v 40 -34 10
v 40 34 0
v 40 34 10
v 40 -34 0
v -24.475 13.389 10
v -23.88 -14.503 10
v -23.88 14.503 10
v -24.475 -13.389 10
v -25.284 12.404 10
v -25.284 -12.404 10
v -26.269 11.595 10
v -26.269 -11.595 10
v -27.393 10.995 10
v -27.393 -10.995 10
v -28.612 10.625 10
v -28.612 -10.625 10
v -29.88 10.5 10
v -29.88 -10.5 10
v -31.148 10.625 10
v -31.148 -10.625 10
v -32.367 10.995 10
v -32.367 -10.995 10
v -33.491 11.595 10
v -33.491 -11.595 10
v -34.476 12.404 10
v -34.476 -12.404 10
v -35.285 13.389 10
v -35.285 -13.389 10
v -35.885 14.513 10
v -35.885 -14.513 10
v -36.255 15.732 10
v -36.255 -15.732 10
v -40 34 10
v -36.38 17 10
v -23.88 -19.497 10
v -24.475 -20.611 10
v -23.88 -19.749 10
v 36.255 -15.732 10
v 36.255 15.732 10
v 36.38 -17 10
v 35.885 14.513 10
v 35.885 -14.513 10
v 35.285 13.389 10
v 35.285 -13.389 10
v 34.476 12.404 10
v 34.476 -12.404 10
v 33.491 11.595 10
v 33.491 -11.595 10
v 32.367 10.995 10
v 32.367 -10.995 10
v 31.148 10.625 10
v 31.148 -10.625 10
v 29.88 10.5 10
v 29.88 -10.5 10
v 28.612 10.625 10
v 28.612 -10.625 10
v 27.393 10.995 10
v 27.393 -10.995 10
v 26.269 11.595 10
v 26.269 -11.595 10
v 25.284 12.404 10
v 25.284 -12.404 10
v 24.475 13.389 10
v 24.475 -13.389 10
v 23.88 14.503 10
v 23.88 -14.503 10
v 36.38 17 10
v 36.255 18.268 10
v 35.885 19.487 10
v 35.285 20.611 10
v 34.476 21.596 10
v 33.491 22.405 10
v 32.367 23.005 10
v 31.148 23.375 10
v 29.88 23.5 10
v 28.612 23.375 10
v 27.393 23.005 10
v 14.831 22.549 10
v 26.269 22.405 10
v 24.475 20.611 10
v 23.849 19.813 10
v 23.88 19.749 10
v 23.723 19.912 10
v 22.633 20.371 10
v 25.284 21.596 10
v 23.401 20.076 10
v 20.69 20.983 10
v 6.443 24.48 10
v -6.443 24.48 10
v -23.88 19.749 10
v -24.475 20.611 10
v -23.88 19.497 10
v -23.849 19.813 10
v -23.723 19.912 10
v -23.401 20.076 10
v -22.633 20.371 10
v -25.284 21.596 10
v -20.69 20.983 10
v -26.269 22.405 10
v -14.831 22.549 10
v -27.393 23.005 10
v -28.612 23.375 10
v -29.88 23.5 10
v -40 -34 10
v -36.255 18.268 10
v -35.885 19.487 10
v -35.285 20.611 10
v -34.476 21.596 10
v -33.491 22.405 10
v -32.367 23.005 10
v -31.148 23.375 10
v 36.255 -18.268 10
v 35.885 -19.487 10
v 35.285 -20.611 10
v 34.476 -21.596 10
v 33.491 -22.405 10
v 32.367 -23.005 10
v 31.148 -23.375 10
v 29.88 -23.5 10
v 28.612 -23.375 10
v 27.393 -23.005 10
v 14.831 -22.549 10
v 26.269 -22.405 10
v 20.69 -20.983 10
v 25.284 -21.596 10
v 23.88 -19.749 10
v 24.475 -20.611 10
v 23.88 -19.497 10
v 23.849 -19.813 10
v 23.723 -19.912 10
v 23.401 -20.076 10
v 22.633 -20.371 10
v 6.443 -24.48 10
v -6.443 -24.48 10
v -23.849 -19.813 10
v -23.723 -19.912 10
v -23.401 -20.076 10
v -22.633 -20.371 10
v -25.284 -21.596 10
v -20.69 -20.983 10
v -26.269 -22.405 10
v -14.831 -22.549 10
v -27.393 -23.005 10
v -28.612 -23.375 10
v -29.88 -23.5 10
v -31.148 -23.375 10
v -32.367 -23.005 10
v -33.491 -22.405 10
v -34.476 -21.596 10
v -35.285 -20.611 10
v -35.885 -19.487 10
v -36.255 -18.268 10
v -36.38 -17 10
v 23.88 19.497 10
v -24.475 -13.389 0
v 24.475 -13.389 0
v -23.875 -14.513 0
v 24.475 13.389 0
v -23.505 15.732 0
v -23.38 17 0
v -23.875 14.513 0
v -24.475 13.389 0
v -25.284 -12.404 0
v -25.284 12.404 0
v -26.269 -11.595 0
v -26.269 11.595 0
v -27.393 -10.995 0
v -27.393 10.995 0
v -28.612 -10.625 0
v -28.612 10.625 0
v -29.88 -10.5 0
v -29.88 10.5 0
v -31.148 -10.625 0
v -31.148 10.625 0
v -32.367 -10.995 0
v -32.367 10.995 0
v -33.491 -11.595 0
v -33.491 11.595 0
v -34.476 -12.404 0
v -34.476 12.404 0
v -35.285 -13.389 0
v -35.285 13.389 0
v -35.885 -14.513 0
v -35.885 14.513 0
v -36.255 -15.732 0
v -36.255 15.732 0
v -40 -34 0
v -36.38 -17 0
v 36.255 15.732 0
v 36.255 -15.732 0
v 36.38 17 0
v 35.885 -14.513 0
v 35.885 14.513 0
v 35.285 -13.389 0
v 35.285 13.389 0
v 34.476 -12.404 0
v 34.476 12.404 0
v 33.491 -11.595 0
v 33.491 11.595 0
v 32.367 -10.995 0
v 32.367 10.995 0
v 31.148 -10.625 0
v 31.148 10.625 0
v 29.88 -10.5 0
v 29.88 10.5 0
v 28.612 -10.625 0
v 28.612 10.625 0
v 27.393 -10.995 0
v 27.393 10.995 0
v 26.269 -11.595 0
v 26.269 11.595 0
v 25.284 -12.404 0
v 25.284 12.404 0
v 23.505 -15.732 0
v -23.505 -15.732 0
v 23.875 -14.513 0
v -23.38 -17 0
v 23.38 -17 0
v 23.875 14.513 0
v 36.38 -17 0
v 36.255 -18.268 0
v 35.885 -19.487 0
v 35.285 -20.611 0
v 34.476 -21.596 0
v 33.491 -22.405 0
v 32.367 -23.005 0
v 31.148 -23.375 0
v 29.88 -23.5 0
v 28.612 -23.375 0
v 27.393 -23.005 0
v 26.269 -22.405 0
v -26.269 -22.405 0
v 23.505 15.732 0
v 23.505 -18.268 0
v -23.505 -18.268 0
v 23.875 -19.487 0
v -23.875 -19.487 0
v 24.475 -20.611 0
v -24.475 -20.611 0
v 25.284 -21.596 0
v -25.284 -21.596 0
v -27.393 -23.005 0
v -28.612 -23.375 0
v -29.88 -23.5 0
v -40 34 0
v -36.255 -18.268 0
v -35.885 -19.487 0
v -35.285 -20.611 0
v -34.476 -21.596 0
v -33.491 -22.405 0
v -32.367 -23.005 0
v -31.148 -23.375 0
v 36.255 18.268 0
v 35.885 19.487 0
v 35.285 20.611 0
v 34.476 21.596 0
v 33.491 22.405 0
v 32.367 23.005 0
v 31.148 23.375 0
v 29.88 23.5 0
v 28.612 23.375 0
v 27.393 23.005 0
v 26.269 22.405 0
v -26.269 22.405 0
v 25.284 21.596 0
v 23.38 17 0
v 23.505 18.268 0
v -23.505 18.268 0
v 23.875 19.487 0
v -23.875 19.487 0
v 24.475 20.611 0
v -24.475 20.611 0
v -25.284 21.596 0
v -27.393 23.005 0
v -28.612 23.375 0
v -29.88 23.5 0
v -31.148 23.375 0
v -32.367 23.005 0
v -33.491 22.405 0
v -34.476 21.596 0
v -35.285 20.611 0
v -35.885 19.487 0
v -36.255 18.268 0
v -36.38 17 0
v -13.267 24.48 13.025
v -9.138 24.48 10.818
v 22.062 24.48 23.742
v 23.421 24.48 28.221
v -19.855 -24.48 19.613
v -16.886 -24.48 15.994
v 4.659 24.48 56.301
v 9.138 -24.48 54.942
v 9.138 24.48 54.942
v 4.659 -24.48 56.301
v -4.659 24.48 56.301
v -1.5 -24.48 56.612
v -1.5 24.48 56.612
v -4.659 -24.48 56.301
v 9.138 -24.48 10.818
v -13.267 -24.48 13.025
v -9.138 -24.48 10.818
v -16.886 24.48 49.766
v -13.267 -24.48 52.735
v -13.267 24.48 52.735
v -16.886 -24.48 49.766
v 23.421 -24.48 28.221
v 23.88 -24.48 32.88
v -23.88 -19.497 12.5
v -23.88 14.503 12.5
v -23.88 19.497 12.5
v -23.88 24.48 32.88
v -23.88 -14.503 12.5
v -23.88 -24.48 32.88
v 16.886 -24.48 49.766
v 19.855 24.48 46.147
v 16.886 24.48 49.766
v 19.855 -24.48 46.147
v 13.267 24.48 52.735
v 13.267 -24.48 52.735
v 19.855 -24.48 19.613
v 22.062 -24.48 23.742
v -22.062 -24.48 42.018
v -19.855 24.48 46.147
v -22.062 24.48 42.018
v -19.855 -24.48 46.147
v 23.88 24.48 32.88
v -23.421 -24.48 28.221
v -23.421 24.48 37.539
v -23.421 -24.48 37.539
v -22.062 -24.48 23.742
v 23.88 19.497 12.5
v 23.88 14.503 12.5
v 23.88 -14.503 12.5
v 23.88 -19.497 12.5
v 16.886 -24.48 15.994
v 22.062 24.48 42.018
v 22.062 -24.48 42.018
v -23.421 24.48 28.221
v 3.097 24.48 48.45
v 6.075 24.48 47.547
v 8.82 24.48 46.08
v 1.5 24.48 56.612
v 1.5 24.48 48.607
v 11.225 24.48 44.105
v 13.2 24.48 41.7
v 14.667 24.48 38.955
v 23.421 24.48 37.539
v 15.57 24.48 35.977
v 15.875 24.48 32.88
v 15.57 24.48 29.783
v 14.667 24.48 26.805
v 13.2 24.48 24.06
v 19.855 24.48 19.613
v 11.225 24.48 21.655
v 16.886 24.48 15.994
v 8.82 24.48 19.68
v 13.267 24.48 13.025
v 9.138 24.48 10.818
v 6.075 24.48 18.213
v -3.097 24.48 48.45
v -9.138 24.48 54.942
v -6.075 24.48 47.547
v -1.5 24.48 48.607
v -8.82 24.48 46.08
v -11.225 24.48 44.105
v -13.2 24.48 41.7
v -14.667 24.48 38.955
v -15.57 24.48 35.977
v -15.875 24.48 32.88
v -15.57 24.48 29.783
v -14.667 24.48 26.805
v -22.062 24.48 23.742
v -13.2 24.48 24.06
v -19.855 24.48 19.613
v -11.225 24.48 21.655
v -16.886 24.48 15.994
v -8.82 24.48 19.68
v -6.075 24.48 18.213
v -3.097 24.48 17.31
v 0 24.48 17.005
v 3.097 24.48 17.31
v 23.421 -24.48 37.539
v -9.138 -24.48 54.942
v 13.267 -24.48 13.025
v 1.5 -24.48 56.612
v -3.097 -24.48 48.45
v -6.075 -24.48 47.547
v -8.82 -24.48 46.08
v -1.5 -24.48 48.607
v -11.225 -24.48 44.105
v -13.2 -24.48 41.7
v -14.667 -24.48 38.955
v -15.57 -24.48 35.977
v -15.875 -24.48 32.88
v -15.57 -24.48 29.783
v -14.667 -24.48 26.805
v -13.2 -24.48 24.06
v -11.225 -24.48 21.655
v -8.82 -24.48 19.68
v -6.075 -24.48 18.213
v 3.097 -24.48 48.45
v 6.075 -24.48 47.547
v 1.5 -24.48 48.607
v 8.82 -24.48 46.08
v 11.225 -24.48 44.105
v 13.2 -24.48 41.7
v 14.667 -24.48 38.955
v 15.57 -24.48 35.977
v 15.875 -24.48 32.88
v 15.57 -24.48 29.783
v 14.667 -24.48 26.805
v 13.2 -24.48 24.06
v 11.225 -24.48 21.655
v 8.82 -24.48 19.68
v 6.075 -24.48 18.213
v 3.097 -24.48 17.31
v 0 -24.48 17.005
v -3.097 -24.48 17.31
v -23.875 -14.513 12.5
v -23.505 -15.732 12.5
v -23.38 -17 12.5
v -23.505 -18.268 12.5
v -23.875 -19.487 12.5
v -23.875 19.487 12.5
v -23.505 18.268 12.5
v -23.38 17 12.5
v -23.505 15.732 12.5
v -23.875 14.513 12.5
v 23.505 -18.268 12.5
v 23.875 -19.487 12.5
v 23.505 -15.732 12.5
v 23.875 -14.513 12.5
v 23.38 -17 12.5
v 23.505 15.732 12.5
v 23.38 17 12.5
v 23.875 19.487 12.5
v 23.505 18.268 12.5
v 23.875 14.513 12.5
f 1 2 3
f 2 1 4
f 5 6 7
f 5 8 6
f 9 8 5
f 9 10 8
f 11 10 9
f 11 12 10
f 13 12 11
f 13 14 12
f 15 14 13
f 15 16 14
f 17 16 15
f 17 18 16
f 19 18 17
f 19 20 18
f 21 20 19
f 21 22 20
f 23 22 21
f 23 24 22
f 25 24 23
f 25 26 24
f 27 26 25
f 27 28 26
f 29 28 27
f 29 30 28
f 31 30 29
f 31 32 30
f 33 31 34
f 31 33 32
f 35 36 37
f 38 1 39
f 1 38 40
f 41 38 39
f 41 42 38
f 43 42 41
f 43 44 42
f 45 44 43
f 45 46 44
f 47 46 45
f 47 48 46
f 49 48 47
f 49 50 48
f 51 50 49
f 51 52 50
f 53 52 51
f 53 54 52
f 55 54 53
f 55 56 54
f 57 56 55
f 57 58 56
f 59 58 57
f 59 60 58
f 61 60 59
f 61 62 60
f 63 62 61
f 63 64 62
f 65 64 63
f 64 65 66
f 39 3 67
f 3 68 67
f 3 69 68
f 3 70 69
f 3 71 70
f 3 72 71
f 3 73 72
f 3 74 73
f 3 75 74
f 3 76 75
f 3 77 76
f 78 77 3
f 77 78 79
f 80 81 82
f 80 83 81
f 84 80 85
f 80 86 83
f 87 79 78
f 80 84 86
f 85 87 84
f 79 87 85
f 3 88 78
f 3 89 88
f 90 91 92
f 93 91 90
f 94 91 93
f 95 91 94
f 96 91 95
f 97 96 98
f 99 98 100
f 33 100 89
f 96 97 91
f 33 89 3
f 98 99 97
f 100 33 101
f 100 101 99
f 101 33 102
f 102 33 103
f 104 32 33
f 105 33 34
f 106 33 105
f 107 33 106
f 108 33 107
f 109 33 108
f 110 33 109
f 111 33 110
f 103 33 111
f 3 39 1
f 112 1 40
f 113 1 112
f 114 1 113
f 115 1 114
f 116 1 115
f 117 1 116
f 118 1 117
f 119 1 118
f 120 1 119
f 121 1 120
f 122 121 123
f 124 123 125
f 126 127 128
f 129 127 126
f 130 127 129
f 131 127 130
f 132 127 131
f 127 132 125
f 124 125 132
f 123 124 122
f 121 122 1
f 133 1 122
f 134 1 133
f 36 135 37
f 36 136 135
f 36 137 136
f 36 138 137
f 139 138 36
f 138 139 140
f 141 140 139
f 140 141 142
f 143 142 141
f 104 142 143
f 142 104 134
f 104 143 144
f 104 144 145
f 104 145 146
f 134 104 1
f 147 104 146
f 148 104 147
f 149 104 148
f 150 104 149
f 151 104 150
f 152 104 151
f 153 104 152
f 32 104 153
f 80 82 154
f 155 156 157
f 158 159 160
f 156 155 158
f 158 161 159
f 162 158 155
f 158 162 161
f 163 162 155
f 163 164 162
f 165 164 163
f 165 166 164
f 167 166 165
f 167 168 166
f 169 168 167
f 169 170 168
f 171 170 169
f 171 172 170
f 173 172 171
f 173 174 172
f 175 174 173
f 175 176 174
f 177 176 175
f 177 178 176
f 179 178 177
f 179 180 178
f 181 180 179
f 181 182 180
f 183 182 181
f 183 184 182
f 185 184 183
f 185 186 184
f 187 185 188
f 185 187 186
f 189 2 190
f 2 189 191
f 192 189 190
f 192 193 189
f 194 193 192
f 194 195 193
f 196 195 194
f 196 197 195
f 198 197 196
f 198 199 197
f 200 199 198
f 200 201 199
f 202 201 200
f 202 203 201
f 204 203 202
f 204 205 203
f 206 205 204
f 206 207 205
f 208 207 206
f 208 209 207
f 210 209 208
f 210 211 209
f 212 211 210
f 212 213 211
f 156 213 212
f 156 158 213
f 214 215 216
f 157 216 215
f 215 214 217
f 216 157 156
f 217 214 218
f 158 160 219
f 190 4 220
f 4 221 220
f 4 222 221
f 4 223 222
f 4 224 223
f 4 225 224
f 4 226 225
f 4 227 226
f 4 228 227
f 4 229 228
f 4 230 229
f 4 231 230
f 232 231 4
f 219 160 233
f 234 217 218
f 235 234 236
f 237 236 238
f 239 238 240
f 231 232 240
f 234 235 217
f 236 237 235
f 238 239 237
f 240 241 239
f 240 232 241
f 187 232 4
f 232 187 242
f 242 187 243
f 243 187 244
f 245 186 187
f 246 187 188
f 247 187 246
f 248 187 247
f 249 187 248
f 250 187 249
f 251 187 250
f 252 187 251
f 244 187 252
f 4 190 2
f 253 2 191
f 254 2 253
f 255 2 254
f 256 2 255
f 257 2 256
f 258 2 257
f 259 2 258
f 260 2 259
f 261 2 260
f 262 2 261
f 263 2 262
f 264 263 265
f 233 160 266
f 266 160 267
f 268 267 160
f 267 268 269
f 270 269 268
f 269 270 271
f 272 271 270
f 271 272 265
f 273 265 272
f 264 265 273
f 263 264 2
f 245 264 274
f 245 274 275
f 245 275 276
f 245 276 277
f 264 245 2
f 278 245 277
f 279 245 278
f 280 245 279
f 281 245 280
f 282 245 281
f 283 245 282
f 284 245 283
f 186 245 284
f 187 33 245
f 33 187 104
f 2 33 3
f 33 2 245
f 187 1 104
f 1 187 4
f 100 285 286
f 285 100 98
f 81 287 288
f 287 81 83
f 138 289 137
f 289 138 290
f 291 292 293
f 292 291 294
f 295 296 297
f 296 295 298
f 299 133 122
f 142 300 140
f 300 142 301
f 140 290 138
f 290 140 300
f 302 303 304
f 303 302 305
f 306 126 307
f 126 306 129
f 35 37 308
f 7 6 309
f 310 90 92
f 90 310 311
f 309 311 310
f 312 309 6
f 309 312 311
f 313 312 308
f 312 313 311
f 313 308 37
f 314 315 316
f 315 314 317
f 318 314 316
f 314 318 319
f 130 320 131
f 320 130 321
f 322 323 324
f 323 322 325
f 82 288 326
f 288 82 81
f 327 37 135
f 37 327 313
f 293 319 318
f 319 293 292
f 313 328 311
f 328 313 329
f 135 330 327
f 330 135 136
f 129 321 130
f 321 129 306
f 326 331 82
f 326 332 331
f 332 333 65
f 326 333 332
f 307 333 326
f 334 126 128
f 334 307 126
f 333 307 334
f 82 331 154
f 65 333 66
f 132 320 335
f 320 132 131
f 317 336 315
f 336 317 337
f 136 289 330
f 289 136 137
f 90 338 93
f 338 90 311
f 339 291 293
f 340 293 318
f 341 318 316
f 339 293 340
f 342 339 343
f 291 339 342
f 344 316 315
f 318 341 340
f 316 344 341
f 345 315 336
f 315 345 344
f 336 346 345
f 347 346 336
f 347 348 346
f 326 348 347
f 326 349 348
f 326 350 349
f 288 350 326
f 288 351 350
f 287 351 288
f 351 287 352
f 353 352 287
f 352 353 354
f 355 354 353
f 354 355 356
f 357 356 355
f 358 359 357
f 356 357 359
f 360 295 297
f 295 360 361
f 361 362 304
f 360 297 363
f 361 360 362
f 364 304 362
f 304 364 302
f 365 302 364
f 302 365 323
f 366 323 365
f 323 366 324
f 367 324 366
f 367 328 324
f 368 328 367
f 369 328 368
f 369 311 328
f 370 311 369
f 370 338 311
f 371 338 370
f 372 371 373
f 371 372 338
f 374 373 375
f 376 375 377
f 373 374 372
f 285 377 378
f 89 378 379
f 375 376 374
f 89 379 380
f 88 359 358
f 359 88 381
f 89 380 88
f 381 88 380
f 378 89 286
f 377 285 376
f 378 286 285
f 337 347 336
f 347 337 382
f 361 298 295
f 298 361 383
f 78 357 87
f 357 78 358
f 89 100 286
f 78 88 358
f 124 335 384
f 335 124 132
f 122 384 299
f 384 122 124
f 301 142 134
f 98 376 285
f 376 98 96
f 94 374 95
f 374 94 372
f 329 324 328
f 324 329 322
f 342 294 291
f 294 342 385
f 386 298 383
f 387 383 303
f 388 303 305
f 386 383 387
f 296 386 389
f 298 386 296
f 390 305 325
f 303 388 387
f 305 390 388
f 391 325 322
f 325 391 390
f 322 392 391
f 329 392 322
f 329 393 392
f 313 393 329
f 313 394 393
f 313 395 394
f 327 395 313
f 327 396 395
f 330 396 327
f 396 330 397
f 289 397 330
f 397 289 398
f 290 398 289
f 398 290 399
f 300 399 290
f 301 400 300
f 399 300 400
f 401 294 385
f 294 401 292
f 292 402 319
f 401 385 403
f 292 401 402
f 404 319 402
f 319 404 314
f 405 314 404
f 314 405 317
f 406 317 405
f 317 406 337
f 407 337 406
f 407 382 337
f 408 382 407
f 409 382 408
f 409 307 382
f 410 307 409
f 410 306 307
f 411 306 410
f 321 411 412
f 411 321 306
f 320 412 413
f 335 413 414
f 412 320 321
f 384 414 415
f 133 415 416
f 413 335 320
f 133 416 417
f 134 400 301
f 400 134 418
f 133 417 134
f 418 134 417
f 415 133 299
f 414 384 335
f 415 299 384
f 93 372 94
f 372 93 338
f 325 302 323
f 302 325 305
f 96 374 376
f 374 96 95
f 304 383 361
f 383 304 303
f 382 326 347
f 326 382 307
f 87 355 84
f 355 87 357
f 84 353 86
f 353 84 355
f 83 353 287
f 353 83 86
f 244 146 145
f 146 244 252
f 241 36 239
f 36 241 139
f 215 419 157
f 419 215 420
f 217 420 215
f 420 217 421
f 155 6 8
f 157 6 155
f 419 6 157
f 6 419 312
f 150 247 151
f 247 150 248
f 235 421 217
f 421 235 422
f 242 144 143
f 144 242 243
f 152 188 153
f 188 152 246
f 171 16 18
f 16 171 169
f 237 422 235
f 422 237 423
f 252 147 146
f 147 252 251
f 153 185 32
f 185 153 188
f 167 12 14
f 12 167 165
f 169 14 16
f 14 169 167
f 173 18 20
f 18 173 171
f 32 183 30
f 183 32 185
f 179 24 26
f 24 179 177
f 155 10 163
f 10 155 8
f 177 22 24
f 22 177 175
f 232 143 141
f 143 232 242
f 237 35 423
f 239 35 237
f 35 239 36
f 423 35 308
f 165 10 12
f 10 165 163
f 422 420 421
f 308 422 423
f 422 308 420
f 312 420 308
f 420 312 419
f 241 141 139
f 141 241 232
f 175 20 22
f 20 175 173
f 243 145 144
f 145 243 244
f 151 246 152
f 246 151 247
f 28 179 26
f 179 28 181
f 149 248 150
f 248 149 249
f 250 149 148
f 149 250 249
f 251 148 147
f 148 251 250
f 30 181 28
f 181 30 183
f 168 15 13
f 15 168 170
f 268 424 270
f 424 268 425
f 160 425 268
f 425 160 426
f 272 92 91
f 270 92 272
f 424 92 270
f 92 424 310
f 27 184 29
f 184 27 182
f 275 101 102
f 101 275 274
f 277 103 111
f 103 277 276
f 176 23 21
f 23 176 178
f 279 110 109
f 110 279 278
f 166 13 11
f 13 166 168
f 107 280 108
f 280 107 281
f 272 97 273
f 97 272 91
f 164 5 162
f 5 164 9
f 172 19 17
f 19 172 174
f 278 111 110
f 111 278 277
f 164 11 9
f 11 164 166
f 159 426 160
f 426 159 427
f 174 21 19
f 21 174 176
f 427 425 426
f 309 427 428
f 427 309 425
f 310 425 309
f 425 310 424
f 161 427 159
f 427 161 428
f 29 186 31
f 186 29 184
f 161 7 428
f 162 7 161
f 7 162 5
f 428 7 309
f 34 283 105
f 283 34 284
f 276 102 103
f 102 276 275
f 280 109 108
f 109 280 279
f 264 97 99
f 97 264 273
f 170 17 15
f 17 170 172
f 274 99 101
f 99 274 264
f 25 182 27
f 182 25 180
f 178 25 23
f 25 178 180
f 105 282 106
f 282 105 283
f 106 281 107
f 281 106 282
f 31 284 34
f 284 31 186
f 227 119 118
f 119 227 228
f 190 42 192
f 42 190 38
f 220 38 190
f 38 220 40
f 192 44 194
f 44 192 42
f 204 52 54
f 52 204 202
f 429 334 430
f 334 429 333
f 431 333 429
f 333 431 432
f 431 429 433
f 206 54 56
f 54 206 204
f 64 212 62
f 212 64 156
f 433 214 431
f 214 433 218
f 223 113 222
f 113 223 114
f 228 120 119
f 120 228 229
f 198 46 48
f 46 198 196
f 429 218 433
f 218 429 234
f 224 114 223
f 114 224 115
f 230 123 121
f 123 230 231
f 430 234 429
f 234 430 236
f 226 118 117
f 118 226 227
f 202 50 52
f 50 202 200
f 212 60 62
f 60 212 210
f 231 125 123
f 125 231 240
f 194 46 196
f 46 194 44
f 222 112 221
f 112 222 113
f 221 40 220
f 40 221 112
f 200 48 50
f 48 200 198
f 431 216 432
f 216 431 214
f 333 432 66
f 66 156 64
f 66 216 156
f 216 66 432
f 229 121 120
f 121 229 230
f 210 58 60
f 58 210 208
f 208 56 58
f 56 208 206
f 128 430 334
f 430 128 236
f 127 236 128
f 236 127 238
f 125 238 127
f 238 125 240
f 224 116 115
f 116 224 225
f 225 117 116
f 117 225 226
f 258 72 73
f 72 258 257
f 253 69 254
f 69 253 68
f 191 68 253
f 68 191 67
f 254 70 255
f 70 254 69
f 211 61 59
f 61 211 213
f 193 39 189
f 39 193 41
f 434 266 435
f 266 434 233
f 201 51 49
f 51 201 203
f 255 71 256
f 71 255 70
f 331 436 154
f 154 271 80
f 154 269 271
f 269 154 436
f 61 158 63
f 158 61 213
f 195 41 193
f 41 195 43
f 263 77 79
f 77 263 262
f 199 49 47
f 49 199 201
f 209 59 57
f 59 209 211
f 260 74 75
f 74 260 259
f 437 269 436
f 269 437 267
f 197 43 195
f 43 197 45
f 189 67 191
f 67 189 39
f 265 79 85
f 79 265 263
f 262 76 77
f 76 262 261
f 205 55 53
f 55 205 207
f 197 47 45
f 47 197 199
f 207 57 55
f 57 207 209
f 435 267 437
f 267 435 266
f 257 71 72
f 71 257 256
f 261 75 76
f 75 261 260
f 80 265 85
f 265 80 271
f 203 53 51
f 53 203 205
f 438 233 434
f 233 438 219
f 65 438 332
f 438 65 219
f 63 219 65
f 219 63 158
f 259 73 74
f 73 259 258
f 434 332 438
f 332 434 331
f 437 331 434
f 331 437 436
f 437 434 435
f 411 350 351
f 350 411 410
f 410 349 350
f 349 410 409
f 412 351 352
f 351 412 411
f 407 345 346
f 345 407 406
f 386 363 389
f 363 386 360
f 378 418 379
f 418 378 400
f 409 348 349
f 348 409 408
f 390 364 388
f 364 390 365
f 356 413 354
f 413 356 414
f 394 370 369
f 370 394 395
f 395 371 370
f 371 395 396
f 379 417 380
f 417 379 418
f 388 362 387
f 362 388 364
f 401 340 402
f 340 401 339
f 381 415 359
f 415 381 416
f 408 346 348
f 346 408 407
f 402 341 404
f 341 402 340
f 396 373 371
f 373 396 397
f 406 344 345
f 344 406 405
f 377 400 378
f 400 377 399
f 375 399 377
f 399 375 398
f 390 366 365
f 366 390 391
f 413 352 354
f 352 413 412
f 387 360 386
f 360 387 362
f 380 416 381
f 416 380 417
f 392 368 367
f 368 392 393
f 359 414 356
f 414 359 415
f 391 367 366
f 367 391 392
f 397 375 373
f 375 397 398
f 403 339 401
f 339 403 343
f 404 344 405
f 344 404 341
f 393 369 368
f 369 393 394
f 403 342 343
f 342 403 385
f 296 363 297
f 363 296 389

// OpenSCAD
$fn = 32;

// ----------------------------------------------------------------------
// Bearing block: 80 x 68 mm base, 31.75 mm bore at 32.88 mm
// ----------------------------------------------------------------------

// --- parameters (mm) ---
base_w = 80;              // base width
base_d = 68;              // base depth
base_t = 10;              // base thickness
bore_d = 31.75;           // shaft / bearing bore
house_r = 23.88;          // housing outer radius
house_len = 48.96;        // housing length along the shaft
foot_w = 47.76;           // foot width under the housing
foot_len = 38.96;         // foot length along the shaft
axis_z = 32.88;           // bore axis height above the base
holes_d = 13;             // mounting holes
hole_x = 29.88;           // mounting hole spacing
groove_w = 3;             // oil groove width

difference() {
  union() {
    /* base plate with its underside on z = 0 */
    translate([0, 0, base_t / 2]) cube([base_w, base_d, base_t], center = true);
    /* hull foot: a straight web blending into the round housing */
    hull() {
      translate([0, 0, base_t - 0.5]) cube([foot_w, foot_len, 1.6], center = true);
      translate([0, 0, axis_z]) rotate([-90, 0, 0]) cylinder(h = house_len, d = 2 * house_r, center = true);
    }
  }
  /* bore through the housing, 2.5 mm clear on both sides */
  translate([0, 0, axis_z]) rotate([-90, 0, 0]) cylinder(h = house_len + 5, d = bore_d, center = true);
  /* oil groove from the top of the housing into the bore */
  translate([-groove_w / 2, -house_len / 2 - 2.5, axis_z + bore_d * 0.17]) cube([groove_w, house_len + 5, house_r + 5]);
  /* mounting holes through the base plate */
  for (hx = [-29.88, 29.88]) {
    for (hy = [-17, 17]) {
      translate([hx, hy, -2.5]) cylinder(h = base_t + 5, d = holes_d);
    }
  }
}
